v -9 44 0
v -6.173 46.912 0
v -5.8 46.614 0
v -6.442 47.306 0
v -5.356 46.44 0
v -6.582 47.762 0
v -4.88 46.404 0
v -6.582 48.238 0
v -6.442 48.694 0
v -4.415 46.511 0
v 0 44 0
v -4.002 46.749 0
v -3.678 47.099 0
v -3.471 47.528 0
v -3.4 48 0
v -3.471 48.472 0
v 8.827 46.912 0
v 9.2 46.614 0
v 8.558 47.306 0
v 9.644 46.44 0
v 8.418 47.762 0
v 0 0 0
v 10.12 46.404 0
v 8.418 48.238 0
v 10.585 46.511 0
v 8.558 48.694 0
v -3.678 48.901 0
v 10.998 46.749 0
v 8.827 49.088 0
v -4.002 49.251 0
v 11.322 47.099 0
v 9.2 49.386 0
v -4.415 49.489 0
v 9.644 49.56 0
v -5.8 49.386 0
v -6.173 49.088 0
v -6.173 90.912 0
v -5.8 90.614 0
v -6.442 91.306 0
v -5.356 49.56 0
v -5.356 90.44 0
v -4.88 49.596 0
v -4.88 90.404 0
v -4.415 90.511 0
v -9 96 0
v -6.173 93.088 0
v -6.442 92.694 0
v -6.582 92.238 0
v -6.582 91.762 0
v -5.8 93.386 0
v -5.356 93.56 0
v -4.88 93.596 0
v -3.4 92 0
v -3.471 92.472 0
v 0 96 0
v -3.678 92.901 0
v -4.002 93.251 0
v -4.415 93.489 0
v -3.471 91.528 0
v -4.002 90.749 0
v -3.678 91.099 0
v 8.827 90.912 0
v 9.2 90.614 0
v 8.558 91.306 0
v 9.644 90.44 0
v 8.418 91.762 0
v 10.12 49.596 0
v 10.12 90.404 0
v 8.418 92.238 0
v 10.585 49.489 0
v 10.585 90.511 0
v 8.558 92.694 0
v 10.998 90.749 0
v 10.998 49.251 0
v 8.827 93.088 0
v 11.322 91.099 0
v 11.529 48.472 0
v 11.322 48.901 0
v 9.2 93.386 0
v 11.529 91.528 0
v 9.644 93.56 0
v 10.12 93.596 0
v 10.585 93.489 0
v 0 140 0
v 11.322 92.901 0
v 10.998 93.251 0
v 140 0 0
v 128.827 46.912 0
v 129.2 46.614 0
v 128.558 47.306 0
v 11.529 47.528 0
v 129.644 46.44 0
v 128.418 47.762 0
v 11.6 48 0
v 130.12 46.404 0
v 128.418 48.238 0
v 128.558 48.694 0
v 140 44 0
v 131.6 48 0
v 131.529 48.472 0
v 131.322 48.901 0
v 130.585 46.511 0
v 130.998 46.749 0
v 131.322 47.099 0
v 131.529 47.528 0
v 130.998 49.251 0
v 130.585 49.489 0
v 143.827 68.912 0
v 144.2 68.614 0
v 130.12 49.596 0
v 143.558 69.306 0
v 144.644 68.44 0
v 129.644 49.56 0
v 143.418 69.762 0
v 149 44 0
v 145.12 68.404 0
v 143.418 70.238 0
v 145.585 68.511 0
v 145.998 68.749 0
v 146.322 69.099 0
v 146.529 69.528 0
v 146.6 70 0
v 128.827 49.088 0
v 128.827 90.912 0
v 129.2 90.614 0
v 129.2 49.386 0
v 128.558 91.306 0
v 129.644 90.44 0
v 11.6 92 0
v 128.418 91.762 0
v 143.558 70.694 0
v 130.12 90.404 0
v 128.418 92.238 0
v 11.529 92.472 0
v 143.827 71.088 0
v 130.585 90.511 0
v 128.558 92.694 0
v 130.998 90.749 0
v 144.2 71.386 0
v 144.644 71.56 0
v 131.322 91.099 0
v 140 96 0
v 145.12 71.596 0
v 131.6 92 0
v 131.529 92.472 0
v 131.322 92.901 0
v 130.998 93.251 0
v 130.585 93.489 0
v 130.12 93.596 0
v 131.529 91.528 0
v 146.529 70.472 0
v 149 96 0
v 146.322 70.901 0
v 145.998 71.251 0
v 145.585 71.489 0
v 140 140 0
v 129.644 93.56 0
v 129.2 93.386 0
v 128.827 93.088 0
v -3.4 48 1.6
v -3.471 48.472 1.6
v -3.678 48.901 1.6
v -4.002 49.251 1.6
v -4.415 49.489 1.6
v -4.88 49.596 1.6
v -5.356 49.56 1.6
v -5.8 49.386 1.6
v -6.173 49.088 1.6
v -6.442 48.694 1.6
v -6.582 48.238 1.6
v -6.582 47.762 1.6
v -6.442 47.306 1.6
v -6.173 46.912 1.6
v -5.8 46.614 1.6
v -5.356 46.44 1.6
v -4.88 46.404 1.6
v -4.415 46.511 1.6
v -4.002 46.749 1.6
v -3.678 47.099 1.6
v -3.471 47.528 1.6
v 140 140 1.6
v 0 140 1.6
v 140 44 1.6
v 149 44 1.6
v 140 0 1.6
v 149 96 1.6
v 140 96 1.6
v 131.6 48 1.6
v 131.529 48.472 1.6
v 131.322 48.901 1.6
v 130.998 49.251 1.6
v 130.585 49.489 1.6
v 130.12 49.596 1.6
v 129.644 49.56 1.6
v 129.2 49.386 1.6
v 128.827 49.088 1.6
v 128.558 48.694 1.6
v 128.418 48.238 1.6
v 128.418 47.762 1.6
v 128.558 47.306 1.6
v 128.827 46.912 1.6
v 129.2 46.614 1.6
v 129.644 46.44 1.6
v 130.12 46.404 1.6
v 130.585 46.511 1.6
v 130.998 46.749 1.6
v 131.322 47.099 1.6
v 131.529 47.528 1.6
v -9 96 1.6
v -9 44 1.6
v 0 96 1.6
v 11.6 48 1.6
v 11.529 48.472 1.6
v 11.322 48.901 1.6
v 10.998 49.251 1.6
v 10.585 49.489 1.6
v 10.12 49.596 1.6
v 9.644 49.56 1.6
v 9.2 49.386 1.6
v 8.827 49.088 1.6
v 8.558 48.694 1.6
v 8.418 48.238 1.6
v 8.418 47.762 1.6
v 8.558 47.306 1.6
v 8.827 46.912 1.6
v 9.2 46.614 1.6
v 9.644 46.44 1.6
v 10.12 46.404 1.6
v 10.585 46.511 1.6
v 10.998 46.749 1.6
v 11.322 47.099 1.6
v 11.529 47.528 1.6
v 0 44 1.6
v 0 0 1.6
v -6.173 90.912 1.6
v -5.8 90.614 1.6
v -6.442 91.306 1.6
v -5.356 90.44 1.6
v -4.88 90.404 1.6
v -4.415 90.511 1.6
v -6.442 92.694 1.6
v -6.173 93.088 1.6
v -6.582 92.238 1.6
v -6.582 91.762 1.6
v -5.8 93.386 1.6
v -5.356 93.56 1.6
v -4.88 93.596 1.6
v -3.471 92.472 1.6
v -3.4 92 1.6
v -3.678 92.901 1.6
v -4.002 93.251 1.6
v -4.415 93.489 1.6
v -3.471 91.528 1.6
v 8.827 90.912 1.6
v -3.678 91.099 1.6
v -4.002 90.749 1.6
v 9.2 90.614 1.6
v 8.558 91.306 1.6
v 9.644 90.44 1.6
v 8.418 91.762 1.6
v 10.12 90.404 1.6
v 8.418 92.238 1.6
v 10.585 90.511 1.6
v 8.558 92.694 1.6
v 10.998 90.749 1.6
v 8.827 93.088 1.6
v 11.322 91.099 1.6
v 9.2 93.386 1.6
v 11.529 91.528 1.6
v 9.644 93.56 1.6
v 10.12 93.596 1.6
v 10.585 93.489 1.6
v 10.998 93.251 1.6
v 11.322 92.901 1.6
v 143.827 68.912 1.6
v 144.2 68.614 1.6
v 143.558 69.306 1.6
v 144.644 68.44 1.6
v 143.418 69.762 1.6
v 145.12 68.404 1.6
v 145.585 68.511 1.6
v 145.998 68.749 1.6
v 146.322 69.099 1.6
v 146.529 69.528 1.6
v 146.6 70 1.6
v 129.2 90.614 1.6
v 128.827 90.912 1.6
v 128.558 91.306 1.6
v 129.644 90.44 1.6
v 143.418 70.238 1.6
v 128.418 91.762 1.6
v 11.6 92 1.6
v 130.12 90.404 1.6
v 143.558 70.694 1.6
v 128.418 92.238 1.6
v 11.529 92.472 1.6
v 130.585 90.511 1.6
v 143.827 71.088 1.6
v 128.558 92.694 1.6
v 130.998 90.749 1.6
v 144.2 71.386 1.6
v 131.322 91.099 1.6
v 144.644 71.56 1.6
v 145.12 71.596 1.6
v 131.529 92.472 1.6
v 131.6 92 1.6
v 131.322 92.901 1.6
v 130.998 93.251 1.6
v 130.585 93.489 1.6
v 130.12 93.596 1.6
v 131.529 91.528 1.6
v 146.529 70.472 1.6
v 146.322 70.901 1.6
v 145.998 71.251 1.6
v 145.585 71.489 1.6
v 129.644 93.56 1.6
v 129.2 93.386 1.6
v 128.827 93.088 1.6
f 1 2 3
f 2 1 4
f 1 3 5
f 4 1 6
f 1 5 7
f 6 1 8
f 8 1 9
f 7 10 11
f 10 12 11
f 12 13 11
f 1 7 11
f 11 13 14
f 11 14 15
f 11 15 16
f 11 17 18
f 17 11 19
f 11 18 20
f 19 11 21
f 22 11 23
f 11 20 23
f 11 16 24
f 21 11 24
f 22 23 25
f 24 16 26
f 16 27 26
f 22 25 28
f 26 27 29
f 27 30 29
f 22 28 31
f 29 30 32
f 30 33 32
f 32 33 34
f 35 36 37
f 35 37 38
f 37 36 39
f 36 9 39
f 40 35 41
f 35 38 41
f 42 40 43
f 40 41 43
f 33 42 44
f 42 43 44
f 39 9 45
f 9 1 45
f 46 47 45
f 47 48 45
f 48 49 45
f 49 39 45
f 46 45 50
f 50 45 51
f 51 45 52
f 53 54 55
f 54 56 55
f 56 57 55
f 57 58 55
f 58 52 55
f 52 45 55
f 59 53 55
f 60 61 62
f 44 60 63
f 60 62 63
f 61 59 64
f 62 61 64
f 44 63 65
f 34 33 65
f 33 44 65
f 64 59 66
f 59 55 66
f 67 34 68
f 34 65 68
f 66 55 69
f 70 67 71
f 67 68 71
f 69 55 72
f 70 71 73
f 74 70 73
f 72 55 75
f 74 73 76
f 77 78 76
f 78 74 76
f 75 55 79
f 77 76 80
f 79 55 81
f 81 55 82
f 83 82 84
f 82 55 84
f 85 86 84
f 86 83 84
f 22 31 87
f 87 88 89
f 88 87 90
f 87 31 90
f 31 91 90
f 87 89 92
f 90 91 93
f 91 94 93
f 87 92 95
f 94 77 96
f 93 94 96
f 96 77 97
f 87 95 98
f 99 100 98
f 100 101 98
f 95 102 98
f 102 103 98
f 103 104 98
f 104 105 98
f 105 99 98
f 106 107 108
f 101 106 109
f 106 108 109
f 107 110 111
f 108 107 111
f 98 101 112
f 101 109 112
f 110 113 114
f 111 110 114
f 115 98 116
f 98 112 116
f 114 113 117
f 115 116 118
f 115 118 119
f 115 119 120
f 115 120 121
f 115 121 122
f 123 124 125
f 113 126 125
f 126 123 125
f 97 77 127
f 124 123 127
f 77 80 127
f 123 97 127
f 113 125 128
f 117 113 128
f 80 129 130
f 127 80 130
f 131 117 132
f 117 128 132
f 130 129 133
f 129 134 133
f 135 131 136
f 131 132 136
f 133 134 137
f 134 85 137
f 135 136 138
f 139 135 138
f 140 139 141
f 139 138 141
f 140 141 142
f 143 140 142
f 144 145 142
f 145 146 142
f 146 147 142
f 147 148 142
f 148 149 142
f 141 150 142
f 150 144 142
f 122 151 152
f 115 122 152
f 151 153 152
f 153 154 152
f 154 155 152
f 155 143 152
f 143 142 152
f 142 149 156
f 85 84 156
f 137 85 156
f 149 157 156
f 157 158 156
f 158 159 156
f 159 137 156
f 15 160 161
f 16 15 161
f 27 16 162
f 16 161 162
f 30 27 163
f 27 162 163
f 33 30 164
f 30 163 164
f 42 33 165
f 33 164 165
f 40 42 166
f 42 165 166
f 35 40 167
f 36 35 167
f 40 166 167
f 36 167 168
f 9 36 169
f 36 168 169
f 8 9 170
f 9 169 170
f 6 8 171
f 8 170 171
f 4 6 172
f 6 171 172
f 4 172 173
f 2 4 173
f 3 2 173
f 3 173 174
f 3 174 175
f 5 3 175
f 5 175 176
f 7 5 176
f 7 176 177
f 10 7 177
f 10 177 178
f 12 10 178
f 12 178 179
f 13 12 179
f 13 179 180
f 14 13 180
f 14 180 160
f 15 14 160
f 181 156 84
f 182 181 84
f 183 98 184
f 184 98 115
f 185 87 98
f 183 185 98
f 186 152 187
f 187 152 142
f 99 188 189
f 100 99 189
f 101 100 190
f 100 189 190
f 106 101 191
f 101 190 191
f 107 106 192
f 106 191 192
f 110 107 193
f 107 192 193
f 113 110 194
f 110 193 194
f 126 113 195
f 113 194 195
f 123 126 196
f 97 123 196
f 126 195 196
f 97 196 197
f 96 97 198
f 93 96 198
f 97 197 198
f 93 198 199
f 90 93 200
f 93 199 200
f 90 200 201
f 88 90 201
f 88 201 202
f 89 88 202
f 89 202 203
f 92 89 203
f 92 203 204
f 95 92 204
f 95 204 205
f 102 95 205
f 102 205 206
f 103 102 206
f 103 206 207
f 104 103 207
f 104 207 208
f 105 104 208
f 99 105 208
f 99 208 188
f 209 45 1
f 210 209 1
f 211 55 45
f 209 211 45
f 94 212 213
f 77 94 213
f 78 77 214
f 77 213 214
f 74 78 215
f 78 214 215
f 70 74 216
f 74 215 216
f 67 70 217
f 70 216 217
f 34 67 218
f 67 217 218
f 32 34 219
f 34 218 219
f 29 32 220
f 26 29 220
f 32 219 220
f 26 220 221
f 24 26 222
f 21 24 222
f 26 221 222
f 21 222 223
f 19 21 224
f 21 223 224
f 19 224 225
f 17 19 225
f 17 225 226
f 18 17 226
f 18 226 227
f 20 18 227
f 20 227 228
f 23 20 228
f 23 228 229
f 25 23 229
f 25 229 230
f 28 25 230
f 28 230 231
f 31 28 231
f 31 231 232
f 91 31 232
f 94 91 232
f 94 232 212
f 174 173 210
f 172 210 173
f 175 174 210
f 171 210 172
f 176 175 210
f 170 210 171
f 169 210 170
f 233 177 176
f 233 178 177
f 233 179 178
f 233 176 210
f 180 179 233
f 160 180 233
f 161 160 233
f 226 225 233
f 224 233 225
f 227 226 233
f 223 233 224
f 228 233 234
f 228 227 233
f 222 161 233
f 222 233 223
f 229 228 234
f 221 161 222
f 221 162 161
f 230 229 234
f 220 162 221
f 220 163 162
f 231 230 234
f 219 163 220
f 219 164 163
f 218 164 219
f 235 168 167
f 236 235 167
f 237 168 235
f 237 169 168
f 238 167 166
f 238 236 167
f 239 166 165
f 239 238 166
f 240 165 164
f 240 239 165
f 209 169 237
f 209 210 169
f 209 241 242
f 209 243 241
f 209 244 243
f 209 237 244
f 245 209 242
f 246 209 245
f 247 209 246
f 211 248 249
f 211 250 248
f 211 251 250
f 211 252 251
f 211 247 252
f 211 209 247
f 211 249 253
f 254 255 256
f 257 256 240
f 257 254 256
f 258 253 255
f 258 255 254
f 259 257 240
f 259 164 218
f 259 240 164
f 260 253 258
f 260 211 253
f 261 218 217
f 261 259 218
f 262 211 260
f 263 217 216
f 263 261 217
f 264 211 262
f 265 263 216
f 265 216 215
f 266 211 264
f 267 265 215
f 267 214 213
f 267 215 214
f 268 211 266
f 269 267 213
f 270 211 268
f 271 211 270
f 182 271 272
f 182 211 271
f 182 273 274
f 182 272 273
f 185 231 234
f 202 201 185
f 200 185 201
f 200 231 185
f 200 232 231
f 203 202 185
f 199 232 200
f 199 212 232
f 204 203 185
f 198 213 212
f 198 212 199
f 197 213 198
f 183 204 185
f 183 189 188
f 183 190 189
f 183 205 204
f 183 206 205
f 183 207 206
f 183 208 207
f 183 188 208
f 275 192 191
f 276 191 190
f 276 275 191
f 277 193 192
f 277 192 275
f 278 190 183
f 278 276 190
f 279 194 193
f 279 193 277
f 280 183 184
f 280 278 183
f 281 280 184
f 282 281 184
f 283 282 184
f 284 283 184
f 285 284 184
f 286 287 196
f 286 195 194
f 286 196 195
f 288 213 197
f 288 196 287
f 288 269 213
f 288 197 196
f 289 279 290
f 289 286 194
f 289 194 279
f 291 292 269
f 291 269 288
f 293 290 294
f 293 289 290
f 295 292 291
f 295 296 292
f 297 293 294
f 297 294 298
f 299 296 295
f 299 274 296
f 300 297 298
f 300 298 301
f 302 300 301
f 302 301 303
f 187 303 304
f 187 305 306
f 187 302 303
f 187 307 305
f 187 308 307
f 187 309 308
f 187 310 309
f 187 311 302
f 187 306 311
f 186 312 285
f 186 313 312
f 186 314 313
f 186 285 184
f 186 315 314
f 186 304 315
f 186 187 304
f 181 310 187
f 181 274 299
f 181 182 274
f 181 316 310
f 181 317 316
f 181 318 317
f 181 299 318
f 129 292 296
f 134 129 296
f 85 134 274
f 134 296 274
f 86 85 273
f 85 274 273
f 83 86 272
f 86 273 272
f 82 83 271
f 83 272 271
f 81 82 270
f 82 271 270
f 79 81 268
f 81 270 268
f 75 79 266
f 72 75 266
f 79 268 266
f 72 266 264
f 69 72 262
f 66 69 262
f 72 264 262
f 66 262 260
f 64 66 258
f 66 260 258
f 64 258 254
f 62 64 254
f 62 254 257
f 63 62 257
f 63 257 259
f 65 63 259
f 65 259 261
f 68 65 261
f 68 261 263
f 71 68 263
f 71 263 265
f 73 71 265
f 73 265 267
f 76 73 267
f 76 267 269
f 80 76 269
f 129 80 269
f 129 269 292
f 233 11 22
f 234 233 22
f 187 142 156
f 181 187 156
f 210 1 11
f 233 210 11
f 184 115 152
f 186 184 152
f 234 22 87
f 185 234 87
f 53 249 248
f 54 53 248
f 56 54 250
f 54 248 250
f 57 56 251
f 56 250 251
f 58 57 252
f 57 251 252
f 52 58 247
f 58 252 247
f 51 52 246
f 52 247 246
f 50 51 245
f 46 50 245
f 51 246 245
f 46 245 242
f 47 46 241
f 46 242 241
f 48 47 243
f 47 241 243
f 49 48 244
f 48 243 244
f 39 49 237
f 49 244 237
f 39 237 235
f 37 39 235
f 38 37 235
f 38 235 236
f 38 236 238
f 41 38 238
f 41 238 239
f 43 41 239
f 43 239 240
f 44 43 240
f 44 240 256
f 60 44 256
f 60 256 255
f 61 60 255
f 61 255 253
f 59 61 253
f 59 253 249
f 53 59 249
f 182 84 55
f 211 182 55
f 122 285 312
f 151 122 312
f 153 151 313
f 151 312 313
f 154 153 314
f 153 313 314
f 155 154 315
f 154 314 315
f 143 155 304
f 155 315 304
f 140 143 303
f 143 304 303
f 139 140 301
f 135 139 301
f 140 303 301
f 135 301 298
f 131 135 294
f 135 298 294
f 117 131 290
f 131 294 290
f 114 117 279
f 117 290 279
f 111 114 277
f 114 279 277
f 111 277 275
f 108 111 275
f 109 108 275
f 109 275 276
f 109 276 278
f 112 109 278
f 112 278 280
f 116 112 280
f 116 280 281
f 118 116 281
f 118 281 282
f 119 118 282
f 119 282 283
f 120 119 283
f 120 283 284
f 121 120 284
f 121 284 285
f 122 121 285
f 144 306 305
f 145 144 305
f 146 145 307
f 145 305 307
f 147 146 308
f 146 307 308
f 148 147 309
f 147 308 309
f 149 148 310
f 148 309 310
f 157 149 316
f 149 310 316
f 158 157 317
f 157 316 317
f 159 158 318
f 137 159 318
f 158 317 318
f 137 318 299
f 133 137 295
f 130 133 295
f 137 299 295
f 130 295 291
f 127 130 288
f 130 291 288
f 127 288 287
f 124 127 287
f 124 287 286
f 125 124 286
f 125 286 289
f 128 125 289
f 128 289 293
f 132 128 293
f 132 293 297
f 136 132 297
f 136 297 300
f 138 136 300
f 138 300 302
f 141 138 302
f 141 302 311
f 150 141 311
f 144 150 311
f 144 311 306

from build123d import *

# Parameters (mm, degrees)
BOSS_EXTRUDE1_DEPTH            = 1.6
F_3_2_3_2_DIAMETER_HOLE1_D     = 3.2
F_3_2_3_2_DIAMETER_HOLE1_DEPTH = 4
F_3_2_3_2_DIAMETER_HOLE1_TIP   = 0.96137699
SKETCH8_R                      = 1.6
CUT_EXTRUDE2_DEPTH             = 205.459189082


with BuildPart() as part:
    # Sketch1 → Boss-Extrude1 (new body)
    with BuildSketch(Plane.XY):
        Polygon((0, 0), (140, 0), (140, 44), (149, 44), (149, 96), (140, 96), (140, 140), (0, 140), (0, 96), (-9, 96), (-9, 44), (0, 44), align=None)
    extrude(amount=BOSS_EXTRUDE1_DEPTH)

    # Ø3.2 (3.2) Diameter Hole1
    with Locations(Plane(origin=(0, 0, 0), x_dir=(-1, 0, 0), z_dir=(0, 0, -1))):
        with Locations((-130, 92), (-130, 48), (-10, 92), (-10, 48)):
            Hole(F_3_2_3_2_DIAMETER_HOLE1_D / 2, depth=F_3_2_3_2_DIAMETER_HOLE1_DEPTH)
            with Locations((0, 0, -(F_3_2_3_2_DIAMETER_HOLE1_DEPTH + F_3_2_3_2_DIAMETER_HOLE1_TIP / 2))):  # 118° drill point
                Cone(0, F_3_2_3_2_DIAMETER_HOLE1_D / 2, F_3_2_3_2_DIAMETER_HOLE1_TIP, mode=Mode.SUBTRACT)

    # Sketch8 → Cut-Extrude2 (cut, through all)
    with BuildSketch(Plane.XY.offset(1.6)):
        with Locations((-5, 92)):
            Circle(SKETCH8_R)
        with Locations((-5, 48)):
            Circle(SKETCH8_R)
        with Locations((145, 70)):
            Circle(SKETCH8_R)
    extrude(amount=-CUT_EXTRUDE2_DEPTH, mode=Mode.SUBTRACT)


solid = part.part
